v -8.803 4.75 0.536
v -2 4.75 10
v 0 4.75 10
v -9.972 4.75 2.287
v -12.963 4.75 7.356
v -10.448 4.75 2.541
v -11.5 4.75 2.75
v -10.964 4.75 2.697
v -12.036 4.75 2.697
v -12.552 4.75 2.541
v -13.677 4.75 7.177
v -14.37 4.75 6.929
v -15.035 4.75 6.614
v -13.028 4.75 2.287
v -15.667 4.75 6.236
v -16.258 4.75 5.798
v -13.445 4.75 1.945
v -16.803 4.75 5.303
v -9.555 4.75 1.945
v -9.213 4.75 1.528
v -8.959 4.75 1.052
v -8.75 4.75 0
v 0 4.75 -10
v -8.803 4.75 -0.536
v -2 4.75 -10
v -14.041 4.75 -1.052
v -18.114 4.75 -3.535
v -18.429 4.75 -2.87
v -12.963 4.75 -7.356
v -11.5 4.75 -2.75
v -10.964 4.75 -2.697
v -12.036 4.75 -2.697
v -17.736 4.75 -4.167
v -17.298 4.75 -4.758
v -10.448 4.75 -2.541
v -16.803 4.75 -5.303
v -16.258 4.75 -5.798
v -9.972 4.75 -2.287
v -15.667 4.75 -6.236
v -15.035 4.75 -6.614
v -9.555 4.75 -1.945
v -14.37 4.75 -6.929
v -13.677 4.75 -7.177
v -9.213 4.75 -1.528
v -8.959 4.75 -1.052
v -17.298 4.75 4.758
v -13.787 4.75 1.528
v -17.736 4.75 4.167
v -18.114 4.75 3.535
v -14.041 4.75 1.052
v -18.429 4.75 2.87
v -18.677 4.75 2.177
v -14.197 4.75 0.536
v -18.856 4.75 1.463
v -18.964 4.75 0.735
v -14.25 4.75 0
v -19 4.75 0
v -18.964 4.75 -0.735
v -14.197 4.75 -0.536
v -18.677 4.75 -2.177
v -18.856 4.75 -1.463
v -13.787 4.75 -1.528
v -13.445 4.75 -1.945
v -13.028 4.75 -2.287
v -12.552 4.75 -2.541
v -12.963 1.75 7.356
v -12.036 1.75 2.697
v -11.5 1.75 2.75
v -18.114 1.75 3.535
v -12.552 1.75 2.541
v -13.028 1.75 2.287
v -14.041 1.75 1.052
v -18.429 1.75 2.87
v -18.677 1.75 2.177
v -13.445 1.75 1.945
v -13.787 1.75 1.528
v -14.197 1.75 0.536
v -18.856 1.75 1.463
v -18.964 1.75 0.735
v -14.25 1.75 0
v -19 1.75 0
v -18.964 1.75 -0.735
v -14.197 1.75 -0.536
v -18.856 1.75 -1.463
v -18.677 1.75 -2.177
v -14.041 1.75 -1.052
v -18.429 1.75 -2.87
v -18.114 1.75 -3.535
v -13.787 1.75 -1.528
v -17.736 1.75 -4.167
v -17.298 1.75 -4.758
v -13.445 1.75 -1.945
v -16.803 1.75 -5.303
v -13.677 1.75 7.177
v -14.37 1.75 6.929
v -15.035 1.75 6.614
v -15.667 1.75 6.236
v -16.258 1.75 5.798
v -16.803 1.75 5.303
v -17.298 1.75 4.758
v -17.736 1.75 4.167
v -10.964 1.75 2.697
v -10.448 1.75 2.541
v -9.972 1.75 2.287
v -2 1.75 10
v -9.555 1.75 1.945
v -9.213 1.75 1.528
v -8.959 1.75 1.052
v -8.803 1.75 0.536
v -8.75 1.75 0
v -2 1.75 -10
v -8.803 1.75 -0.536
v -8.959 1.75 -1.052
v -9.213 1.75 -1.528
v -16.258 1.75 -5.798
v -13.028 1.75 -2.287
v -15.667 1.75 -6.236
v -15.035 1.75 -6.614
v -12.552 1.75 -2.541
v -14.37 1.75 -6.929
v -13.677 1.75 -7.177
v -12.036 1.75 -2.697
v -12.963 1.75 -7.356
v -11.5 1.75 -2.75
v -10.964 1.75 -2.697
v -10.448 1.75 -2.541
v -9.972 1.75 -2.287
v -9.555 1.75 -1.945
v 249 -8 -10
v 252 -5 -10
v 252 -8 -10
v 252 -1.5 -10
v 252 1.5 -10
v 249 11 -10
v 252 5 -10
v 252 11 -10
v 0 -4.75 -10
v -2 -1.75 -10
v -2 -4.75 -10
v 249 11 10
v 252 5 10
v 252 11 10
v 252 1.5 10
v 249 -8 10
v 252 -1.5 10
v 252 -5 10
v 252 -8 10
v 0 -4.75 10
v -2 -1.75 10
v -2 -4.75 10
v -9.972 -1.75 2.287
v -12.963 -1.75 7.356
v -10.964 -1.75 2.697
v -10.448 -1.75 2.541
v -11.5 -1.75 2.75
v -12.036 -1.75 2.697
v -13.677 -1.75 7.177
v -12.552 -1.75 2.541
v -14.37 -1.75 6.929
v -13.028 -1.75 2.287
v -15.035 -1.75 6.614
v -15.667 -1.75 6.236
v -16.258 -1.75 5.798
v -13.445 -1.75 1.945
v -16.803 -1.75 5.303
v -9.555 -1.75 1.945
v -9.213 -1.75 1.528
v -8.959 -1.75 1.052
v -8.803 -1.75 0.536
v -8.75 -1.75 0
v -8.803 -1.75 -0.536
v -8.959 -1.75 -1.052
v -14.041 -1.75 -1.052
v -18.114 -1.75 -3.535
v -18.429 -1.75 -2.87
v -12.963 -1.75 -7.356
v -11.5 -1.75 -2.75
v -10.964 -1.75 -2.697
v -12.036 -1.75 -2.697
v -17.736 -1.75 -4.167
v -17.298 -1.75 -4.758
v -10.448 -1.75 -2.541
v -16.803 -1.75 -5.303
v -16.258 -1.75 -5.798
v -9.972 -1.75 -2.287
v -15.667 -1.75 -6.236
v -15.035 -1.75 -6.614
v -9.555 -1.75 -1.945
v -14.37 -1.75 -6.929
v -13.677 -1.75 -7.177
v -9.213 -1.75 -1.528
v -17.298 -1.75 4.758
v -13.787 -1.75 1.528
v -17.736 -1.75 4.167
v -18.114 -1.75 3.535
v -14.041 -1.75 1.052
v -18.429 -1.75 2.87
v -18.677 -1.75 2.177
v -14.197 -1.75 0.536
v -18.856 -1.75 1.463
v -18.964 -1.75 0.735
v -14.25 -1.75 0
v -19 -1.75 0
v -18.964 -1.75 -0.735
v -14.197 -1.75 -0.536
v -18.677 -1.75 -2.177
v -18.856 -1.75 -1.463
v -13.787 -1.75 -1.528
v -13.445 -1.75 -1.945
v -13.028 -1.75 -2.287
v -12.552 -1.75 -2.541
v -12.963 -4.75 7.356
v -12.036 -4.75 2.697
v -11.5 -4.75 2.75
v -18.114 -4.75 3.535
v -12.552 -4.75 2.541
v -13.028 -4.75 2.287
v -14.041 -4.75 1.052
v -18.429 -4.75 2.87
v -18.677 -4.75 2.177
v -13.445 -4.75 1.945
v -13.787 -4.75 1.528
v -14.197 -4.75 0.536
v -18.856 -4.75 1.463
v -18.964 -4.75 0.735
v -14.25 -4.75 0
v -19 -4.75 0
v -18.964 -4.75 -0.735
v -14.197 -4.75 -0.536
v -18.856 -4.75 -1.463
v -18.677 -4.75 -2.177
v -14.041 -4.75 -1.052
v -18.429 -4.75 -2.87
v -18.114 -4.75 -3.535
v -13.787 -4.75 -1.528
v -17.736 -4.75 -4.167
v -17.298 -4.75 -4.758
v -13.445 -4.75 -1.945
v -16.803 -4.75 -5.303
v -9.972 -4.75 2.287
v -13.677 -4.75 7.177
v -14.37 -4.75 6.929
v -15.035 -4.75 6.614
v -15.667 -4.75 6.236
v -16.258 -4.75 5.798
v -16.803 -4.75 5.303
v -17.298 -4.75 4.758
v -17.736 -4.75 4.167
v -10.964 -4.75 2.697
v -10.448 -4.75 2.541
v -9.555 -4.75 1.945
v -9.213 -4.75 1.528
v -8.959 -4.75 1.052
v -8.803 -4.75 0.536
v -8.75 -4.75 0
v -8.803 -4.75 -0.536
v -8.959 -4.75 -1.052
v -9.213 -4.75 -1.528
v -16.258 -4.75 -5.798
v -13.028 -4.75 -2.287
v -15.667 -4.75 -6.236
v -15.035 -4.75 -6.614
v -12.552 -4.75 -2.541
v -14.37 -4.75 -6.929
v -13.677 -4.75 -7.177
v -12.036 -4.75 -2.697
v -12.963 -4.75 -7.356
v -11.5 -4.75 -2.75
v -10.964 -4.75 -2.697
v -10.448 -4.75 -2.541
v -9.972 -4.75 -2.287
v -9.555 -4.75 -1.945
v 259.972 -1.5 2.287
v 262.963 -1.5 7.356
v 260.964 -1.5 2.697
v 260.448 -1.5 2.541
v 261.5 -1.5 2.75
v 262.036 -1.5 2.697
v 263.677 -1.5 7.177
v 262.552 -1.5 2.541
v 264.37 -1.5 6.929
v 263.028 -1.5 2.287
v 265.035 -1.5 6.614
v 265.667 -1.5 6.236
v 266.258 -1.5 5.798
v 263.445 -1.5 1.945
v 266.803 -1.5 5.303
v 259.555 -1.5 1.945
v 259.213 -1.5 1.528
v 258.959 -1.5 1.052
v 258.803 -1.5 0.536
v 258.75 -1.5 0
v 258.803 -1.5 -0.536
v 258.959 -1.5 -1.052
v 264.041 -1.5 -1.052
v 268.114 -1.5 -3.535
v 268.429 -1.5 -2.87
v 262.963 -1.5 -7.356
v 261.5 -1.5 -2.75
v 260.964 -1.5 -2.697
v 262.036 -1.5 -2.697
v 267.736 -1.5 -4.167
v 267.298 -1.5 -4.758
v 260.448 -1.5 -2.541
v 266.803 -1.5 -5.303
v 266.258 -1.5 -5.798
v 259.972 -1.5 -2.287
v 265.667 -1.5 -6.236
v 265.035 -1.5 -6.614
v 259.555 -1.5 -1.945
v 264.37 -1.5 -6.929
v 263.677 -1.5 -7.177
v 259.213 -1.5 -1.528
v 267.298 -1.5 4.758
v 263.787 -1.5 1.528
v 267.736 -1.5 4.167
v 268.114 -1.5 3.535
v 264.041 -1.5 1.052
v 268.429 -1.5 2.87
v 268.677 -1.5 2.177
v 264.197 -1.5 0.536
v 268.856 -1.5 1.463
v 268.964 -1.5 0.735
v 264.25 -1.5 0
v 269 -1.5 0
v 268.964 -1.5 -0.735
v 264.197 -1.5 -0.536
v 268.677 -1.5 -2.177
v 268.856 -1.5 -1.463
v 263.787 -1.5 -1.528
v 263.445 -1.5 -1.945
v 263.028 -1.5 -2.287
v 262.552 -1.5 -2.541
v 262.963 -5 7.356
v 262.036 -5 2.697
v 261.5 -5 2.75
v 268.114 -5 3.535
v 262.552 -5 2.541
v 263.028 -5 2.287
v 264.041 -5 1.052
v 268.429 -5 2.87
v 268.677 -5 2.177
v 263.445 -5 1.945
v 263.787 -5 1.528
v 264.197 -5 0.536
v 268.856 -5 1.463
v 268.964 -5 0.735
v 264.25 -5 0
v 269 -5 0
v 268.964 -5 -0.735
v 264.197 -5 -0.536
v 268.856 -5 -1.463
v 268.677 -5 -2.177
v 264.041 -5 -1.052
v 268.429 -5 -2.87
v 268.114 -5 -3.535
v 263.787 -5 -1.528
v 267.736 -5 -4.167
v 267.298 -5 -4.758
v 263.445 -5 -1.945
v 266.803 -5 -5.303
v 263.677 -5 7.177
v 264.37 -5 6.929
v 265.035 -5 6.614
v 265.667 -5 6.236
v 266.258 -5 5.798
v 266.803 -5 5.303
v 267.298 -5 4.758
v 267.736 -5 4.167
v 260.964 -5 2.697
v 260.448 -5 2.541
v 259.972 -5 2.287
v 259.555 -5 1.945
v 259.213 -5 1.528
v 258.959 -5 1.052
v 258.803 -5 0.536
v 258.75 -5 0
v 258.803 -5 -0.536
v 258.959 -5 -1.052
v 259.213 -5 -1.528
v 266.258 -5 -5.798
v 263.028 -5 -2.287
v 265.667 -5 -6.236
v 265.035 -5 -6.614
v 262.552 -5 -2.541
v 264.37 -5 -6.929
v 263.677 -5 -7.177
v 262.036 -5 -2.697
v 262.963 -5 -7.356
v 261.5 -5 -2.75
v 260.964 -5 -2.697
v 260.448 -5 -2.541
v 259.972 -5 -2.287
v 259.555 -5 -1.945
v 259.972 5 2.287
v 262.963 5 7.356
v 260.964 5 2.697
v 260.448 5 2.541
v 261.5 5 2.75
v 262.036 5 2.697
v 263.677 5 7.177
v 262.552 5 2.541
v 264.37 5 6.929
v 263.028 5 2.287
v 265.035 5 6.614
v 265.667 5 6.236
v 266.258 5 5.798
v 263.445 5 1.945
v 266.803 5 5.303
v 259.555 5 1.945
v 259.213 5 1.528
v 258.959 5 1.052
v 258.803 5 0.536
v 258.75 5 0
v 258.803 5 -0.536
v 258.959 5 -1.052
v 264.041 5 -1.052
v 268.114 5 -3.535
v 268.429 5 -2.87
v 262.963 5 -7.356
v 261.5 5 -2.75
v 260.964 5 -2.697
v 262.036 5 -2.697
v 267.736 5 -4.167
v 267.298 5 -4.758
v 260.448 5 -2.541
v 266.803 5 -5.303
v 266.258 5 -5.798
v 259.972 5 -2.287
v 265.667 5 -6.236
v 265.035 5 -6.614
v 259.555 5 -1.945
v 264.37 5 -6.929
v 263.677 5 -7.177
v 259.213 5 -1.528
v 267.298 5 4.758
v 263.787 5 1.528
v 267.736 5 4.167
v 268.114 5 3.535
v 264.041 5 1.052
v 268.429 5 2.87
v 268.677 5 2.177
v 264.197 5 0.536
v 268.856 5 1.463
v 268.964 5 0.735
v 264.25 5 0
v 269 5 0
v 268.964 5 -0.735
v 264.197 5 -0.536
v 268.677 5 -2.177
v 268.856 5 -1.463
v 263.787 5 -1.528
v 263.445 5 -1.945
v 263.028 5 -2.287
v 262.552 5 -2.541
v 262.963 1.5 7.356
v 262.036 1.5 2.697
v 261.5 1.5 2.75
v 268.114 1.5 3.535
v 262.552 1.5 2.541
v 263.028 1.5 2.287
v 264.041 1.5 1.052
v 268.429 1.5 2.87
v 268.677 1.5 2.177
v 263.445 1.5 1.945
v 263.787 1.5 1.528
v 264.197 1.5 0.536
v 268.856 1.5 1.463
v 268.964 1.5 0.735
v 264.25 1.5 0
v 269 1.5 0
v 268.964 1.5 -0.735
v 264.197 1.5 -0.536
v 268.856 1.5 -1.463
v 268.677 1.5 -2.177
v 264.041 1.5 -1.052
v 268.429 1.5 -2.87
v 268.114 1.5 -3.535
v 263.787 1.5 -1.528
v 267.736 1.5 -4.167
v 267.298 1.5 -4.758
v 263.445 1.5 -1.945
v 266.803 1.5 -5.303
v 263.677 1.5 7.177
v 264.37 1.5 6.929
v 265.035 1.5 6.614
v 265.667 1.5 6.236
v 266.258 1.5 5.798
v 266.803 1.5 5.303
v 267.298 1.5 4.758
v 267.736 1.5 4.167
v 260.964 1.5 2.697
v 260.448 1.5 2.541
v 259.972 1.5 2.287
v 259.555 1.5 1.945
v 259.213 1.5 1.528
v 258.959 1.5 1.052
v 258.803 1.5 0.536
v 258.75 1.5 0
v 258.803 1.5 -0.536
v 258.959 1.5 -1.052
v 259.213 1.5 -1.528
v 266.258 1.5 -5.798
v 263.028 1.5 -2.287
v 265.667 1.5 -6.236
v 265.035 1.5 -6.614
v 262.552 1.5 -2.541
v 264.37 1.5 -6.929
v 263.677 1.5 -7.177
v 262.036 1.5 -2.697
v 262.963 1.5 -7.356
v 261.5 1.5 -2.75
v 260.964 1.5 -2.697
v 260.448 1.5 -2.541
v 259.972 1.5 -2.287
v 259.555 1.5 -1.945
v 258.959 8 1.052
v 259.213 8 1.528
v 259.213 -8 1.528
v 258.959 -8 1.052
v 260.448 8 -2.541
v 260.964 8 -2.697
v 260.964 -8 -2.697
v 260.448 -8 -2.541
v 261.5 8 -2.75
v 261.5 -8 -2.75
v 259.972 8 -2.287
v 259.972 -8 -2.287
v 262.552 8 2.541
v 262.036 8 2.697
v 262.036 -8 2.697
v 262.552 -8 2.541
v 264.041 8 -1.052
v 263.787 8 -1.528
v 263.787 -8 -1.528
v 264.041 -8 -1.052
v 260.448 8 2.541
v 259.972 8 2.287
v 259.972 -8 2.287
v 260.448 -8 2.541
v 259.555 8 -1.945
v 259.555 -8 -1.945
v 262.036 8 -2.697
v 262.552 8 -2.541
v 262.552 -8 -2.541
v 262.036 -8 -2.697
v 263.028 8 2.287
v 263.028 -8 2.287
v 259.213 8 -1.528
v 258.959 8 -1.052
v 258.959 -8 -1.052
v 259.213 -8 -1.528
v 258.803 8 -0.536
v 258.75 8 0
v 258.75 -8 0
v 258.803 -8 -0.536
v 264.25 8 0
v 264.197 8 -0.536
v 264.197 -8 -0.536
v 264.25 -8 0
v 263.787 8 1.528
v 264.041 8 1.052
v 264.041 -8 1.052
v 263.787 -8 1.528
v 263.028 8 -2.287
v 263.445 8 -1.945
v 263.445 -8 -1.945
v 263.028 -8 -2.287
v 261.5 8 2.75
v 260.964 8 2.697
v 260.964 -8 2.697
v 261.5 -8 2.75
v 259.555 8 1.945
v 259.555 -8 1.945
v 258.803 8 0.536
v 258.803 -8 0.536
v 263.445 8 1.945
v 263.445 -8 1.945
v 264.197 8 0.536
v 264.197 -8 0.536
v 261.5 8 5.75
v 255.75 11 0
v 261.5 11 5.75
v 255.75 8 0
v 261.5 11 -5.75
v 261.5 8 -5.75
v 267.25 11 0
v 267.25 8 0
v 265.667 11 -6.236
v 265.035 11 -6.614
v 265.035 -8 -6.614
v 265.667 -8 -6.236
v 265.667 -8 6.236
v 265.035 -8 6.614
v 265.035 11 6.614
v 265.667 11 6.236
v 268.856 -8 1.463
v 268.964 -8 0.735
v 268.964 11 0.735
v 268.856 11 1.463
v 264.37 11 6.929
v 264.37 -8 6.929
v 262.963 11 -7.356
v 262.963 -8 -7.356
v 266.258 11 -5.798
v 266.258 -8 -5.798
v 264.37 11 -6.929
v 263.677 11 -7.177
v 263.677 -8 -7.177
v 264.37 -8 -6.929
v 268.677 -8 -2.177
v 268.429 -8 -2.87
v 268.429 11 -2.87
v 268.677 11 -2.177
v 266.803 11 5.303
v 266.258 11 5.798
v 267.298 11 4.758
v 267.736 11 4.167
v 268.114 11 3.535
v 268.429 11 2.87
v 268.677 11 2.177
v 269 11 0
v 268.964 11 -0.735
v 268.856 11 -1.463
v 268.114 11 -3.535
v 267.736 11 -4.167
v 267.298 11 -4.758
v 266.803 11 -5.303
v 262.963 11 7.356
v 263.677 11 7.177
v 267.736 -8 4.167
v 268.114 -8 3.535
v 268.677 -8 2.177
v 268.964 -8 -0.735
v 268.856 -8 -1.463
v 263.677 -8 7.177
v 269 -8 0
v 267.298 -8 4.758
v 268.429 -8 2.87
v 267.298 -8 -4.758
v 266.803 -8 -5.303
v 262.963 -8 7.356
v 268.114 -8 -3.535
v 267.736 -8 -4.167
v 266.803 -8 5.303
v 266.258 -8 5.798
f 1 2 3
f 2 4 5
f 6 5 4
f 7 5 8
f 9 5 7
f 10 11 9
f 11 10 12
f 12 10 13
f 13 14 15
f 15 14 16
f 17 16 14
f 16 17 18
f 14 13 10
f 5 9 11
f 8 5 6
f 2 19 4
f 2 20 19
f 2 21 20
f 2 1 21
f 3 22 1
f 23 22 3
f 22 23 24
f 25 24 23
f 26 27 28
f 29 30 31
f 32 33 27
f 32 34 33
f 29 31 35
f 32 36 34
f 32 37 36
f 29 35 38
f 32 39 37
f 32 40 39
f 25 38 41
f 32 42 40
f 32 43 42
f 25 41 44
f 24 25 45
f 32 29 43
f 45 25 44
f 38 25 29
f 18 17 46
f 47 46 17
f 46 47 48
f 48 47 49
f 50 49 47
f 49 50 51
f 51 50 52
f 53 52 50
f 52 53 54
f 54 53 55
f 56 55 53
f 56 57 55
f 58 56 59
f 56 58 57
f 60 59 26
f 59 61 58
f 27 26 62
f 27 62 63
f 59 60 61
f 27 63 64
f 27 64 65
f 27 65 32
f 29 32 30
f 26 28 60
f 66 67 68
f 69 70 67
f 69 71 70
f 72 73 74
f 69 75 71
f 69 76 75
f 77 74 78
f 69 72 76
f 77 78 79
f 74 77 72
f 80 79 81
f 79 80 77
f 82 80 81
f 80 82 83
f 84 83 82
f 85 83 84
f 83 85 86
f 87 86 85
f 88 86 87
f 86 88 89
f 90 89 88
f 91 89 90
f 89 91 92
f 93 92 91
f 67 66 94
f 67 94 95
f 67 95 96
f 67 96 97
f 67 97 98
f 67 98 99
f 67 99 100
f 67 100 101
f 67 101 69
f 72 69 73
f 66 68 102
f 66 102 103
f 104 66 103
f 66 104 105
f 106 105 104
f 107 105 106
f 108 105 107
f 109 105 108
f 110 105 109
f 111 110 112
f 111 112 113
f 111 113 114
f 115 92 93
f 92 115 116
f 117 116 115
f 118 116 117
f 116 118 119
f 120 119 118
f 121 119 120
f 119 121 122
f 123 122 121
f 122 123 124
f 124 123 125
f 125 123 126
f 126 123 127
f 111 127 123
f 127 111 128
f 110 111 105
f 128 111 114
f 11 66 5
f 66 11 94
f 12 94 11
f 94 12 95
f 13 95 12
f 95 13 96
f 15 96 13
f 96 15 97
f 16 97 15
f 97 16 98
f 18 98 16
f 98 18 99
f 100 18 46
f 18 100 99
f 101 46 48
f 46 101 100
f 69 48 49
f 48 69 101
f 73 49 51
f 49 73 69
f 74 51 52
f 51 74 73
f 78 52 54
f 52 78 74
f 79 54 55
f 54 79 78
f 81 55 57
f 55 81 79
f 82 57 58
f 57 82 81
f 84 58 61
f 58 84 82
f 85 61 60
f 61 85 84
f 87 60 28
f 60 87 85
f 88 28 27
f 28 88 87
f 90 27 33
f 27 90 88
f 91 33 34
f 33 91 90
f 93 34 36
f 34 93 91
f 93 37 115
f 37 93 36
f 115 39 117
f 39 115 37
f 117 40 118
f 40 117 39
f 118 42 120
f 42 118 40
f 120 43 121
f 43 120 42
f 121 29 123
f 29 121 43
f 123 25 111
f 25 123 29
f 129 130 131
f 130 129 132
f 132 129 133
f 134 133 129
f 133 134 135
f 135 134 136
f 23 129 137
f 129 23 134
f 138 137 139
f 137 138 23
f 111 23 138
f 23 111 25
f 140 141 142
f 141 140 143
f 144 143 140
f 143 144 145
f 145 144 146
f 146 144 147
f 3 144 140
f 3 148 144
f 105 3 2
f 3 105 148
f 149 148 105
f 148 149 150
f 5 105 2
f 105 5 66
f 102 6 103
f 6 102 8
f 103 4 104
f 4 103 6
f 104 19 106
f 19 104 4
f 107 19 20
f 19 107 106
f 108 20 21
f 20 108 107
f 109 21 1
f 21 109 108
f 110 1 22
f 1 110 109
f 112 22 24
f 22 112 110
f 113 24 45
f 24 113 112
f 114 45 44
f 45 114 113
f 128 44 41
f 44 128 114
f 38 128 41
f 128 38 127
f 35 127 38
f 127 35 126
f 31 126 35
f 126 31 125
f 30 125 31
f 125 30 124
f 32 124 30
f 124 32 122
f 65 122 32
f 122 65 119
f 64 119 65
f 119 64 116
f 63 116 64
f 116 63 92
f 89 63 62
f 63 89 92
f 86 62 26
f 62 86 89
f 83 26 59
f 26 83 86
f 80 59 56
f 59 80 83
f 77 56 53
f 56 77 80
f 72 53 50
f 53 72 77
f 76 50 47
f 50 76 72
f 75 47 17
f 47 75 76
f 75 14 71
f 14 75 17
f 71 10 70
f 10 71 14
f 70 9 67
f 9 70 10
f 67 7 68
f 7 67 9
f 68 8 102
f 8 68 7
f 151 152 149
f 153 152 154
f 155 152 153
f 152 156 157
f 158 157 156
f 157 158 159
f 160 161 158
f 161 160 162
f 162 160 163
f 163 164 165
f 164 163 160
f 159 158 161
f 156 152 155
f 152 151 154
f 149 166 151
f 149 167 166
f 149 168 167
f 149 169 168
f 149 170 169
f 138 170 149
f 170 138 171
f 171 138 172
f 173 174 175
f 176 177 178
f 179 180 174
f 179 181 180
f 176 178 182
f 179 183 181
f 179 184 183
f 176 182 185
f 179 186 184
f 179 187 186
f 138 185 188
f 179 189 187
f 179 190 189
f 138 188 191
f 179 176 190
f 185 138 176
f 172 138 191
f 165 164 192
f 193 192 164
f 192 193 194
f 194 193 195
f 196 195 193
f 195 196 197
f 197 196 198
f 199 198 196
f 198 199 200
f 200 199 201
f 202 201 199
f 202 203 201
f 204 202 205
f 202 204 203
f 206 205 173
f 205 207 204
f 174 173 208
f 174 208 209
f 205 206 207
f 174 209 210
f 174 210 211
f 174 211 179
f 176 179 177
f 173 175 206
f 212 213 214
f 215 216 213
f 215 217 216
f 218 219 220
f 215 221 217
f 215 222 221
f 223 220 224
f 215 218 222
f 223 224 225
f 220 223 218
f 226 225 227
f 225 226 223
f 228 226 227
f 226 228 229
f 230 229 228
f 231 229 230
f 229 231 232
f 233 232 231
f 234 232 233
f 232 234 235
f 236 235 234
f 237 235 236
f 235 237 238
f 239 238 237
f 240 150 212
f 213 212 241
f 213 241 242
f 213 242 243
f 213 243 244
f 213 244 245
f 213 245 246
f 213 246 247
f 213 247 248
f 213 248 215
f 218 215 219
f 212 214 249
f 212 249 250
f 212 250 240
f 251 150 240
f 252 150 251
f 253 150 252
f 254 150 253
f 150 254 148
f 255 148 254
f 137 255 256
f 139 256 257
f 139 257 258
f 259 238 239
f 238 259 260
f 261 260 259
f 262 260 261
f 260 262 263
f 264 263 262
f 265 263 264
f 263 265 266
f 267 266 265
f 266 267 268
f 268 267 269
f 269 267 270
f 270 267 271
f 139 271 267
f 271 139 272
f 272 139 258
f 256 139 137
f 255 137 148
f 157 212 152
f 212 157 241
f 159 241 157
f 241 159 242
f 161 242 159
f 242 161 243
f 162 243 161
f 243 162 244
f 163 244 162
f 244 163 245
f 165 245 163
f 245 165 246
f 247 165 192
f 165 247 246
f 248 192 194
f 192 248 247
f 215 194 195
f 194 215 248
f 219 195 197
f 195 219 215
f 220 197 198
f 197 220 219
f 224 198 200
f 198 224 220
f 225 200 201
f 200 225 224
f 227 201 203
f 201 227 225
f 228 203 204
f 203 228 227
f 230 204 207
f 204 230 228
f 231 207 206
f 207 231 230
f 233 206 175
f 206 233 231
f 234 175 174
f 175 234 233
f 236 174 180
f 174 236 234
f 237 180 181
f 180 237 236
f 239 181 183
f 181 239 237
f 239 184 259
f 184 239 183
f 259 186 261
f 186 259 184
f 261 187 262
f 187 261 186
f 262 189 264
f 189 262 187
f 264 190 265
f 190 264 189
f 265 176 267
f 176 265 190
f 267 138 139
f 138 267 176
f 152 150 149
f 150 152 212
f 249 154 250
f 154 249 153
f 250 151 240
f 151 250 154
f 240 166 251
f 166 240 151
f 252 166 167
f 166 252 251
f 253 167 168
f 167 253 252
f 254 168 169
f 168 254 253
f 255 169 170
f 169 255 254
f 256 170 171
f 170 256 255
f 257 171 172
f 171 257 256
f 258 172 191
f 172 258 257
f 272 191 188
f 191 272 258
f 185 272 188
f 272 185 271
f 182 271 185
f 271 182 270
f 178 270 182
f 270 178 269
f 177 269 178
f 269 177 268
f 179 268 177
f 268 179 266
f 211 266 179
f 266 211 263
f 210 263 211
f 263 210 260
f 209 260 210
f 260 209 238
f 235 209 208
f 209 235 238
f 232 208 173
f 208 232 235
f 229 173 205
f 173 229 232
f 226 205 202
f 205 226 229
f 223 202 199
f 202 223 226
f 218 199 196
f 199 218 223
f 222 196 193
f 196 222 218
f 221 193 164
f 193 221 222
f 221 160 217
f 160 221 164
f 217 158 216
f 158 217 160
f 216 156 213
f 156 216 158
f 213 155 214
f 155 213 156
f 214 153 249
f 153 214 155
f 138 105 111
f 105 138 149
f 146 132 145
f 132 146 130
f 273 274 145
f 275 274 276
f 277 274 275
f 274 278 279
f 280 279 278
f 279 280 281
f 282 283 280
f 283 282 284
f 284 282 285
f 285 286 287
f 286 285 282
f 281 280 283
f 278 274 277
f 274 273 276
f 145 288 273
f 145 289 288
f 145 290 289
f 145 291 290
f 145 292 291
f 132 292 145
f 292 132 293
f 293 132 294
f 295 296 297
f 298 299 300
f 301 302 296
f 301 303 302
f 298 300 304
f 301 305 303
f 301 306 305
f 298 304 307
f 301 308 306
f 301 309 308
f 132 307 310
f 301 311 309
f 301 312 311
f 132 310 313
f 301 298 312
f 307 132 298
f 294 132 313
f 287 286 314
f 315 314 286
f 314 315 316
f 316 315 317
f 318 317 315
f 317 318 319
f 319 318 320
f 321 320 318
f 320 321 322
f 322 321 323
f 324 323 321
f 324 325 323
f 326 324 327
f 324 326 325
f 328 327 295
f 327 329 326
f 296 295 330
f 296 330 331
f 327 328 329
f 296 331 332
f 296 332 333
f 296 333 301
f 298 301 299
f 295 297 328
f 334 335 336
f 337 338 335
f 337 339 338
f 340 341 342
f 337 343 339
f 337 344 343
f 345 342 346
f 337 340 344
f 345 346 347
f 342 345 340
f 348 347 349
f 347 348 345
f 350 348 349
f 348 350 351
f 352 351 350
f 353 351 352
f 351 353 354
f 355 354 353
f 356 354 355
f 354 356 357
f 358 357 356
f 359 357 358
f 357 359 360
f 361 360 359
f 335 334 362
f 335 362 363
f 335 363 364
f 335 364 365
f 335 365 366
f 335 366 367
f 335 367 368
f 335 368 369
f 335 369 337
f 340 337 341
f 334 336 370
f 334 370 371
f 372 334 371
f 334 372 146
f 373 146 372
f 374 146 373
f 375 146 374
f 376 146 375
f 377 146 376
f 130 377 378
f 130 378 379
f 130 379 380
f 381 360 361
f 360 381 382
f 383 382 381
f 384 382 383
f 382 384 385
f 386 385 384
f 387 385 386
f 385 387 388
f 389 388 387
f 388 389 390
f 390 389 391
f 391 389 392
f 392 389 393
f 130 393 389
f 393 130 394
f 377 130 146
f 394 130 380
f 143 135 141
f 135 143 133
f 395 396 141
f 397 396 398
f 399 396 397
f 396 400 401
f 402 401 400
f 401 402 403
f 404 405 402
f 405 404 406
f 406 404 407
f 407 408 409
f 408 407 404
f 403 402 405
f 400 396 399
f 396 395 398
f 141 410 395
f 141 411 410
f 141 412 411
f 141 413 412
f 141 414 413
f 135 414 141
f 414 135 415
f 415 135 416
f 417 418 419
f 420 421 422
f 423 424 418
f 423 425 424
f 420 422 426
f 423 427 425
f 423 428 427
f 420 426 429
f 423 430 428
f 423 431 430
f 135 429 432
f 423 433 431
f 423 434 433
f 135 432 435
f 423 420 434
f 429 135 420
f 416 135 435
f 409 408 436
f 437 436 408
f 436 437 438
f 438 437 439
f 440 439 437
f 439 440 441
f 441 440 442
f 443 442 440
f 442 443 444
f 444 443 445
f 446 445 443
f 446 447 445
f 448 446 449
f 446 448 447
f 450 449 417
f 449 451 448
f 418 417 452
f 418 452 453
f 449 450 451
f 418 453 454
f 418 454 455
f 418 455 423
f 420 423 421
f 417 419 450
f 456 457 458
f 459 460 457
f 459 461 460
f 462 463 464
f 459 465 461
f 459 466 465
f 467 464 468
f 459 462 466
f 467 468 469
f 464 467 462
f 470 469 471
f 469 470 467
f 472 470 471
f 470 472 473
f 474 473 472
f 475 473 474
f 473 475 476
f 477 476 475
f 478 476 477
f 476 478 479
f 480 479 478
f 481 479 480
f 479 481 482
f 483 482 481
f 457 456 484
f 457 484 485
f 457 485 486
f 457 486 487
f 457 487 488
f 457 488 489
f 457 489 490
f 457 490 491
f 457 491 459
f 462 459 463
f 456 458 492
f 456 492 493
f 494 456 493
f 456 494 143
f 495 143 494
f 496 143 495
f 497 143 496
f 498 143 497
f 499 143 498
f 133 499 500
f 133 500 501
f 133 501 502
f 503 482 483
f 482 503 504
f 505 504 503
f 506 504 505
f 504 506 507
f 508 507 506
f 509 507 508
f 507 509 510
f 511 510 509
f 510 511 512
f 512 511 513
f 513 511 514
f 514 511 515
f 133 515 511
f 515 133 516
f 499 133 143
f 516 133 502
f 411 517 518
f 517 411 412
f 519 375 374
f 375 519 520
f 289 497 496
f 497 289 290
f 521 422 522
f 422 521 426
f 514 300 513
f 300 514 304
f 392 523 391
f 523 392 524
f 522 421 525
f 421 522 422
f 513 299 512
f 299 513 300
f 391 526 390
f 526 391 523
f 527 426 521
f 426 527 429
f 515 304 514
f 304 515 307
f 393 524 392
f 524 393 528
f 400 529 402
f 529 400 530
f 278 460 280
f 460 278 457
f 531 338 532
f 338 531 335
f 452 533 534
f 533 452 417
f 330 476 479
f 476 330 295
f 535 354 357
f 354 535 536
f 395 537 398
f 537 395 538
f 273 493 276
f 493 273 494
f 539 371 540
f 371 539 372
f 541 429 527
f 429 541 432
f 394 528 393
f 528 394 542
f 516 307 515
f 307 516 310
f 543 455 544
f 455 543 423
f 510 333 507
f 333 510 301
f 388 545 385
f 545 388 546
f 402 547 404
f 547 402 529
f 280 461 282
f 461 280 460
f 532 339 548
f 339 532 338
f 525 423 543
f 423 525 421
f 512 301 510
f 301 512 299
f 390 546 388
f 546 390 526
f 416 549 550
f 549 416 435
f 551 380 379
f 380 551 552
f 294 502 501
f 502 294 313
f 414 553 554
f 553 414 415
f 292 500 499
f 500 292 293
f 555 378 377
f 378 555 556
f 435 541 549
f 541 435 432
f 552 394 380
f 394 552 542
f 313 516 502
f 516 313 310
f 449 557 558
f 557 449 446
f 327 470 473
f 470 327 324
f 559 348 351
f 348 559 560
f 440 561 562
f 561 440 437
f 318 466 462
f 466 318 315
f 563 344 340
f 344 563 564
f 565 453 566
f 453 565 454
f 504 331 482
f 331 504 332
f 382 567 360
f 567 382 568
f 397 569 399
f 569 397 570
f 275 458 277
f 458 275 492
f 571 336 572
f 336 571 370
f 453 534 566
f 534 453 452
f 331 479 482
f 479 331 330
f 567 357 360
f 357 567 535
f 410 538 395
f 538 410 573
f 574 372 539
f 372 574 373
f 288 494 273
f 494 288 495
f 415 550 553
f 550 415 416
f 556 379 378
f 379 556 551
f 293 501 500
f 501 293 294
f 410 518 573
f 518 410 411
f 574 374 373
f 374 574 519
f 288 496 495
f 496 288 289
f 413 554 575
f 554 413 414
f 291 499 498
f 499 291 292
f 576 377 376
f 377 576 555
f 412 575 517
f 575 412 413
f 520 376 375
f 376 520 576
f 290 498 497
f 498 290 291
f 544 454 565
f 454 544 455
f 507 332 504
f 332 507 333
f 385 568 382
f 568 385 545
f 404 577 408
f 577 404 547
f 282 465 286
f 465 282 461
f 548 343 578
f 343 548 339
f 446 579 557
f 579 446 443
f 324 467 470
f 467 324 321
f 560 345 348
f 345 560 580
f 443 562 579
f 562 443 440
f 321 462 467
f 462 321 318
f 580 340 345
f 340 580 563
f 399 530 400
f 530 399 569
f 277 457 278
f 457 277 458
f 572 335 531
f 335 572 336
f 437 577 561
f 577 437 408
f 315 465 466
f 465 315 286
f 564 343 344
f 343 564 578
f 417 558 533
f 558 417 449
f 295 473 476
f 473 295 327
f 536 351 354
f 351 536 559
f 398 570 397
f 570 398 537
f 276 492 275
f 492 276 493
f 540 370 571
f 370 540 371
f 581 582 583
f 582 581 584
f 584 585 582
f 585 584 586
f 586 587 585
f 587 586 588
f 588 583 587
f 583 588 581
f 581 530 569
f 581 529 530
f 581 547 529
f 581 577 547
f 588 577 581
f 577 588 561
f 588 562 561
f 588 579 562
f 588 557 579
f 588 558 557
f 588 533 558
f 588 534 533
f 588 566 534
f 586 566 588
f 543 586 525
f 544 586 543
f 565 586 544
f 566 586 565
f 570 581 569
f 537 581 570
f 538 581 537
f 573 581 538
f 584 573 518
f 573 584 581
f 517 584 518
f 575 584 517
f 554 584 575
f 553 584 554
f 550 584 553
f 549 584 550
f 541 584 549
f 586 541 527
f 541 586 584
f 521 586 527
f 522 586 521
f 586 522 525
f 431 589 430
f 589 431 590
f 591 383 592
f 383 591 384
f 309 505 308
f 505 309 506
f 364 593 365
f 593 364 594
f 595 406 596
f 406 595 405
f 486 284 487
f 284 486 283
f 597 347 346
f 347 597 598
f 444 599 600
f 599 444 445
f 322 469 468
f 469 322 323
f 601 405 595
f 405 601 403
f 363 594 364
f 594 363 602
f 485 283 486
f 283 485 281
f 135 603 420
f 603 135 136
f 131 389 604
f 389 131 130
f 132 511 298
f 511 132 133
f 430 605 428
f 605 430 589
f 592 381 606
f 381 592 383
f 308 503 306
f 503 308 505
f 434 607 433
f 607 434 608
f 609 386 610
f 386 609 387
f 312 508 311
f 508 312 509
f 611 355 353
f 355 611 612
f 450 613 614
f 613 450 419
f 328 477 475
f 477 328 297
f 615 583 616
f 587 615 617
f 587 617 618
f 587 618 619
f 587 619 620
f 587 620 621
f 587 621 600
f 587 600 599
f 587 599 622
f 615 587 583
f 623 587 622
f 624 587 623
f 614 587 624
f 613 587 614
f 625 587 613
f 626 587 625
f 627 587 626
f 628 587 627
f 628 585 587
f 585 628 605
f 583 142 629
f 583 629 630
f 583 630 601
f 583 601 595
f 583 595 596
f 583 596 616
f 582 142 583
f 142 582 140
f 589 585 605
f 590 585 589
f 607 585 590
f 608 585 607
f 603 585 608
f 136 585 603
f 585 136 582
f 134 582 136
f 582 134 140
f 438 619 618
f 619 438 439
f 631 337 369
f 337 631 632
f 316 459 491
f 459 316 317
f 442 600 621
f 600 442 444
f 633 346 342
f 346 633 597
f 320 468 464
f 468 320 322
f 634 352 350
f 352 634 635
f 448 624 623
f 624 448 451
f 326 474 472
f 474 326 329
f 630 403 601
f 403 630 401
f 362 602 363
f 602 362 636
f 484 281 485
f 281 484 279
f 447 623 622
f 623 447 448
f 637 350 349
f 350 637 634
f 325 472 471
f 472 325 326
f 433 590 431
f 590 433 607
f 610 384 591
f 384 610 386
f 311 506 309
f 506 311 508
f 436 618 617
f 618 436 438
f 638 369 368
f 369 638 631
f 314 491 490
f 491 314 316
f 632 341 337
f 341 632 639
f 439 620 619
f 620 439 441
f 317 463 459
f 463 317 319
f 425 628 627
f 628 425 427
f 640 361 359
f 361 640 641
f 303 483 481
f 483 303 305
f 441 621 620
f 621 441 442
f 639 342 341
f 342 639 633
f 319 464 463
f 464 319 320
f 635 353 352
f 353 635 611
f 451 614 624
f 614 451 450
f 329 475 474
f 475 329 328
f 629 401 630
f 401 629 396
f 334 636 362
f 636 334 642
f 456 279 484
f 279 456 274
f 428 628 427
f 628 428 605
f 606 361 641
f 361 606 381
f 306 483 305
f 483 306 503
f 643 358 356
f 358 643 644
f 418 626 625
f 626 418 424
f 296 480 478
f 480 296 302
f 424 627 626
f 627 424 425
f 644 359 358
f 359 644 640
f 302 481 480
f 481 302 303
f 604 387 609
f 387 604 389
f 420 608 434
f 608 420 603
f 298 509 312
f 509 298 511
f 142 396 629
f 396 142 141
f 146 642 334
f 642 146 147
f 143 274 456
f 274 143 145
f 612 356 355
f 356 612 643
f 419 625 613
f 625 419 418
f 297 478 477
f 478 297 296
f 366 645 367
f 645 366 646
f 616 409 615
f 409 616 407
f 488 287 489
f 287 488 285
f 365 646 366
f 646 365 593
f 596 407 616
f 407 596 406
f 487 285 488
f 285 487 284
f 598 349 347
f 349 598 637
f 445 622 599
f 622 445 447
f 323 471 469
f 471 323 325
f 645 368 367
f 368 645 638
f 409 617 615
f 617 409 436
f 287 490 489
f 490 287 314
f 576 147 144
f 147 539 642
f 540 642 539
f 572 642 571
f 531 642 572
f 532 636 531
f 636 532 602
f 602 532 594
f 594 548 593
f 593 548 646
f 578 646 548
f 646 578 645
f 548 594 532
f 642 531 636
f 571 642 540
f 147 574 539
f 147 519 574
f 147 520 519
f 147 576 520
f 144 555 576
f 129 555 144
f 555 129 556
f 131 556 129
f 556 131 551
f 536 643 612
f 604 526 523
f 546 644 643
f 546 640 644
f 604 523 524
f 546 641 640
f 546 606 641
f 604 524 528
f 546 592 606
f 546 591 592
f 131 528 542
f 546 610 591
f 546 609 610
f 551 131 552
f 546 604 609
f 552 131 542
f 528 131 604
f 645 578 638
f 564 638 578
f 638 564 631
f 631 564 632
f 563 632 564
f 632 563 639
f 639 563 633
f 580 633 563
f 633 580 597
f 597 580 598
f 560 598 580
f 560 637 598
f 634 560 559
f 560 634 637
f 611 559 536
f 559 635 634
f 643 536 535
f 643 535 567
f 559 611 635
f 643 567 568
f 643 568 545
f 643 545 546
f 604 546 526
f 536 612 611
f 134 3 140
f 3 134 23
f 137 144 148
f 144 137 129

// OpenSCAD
// file: ../GoPro.scad
/****************************************************************************
 * Altair's GoPro mounts library for OpenSCAD   version: 1.2.2 (2021-05-23) *
 * Copyright (c) Michal A. Valasek, 2021                                    *
 * ------------------------------------------------------------------------ *
 * www.rider.cz | www.altair.blog | github.com/ridercz/GoProScad            *
 ****************************************************************************/

// These values are fixed and defined by GoPro mount standard
__gopro_outer_diameter = 15;            // Outer diameter of the legs
__gopro_leg_width = 3;                  // Width of the legs
__gopro_slit_width = 3.5;               // Width of the slits, including tolerance
__gopro_hole_diameter = 5;              // M5
__gopro_hole_tolerance = .5;            // Print tolerance for hole
__gopro_screw_extension_length = 18;    // Length of the part of screw that sticks out
__gopro_screw_head_diameter = 9.5;      // M5
__gopro_screw_head_height = 3.5;        // M5
__gopro_wall_shaft = 1.67;              // Thickness of wall in the narrow part
__gopro_wall_head = 3;                  // Thickness of wall in the wide part
__gopro_knurl_diameter = 4;             // Diameter of knurls
__gopro_knurl_offset = -1;              // Center distance offset of knurls

module gopro_mount_f(base_height = 3, base_width = 20, leg_height = 17, nut_diameter = 11.5, nut_sides = 4, nut_depth = 3, center = false, $fudge = 1) {
    // Check arguments
    assert(base_height > 0, "Parameter base_height must be greater than zero.");
    assert(base_width >= 15, "Parameter base_width must be at least 15.");
    assert(leg_height >= 15, "Parameter leg_height must be at least 15.");
    assert(nut_sides == 4 || nut_sides == 6, "Parameter nut_sides must be either 4 or 6.");

    // Computed values
    hole_offset = leg_height - __gopro_outer_diameter / 2 + base_height;
    base_depth = __gopro_slit_width * 2 + __gopro_leg_width * 3 + nut_depth;
    center_offset_y = __gopro_leg_width * 1.5 + __gopro_slit_width;

    // Model itself
    translate(center ? [0, -center_offset_y] : [0, 0]) difference() {
        // Outer shape
        hull() {
            translate([-base_width / 2, 0]) cube([base_width, base_depth, base_height]);
            translate([0, 0, hole_offset]) rotate([-90, 0, 0]) cylinder(d = __gopro_outer_diameter, h = base_depth, $fn = 64);
        }

        // Leg slits
        for(y_offset = [__gopro_leg_width, 2 * __gopro_leg_width + __gopro_slit_width]) translate([-base_width / 2 - $fudge, y_offset, base_height]) cube([base_width + 2 * $fudge, __gopro_slit_width, leg_height]);

        // Screw + nut hole
        translate([0, -$fudge, hole_offset]) rotate([-90, 0,0]) {
            cylinder(d = __gopro_hole_diameter + __gopro_hole_tolerance, h = base_depth + 2 * $fudge, $fn = 32);
            if(nut_depth > 0) translate([0, 0, base_depth + $fudge - nut_depth]) cylinder(d = nut_diameter, h = nut_depth + $fudge, $fn = nut_sides);
        }
    }
}

module gopro_mount_m(base_height = 3, base_width = 20, leg_height = 17, center = false) {
    assert(base_height > 0, "Parameter base_height must be greater than zero.");
    assert(base_width >= 15, "Parameter base_width must be at least 15.");
    assert(leg_height >= 15, "Parameter leg_height must be at least 15.");

    // Computed values
    base_depth = __gopro_leg_width * 2 + __gopro_slit_width;
    hole_offset = [base_height + leg_height - __gopro_outer_diameter / 2, base_width / 2];

    // Model itself
    translate(center ? [0, -base_depth / 2] : [0, 0]) {
        translate([-base_width / 2, 0]) cube([base_width, __gopro_leg_width * 2 + __gopro_slit_width, base_height]);
        translate([0, __gopro_leg_width + __gopro_slit_width / 2]) rotate(90) translate([base_depth / 2, -hole_offset[1]]) rotate([0, -90, 0]) for(z_offset = [0, __gopro_leg_width + __gopro_slit_width]) translate([0, 0, z_offset]) linear_extrude(__gopro_leg_width) difference() {
            hull() {
                square([base_height, base_width]);
                translate(hole_offset) circle(d = __gopro_outer_diameter, $fn = 64);
            }
            translate(hole_offset) circle(d = __gopro_hole_diameter + __gopro_hole_tolerance, $fn = 32);
        }
    }
}

module gopro_screw_handle(screw_length = 50, total_length = 0, hex_head = true, $fudge = 1) {
    assert(screw_length > __gopro_screw_extension_length + 3, "Parameter screw_length is too short.");

    // Computed values
    screw_inner_length = screw_length - __gopro_screw_extension_length;
    screw_hole_diameter = __gopro_hole_diameter + (hex_head ? __gopro_hole_tolerance : 0);
    real_total_length = total_length > 0 ? total_length : screw_inner_length + 3 * __gopro_screw_head_height;
    handle_length = real_total_length - screw_inner_length + (hex_head ? 0 : __gopro_screw_head_height);

    difference() {
        union() {
            // Base shape
            hull() {
                cylinder(d = screw_hole_diameter + 2 * __gopro_wall_shaft, h = real_total_length, $fn = 32);
                cylinder(d = __gopro_screw_head_diameter + 2 * __gopro_wall_head, h = handle_length, $fn = 6);
            }

            // Knurls
            for(a = [0 : 60 : 359]) rotate(a) translate([__gopro_screw_head_diameter / 2 + __gopro_wall_head + __gopro_knurl_offset, 0]) {
                cylinder(d = __gopro_knurl_diameter, h = handle_length * .75, $fn = 24);
                translate([0, 0, handle_length * .75]) cylinder(d1 = __gopro_knurl_diameter, d2 = 0, h = handle_length * .25, $fn = 16);
            }
        }

        // Screw hole
        translate([0, 0, -$fudge]) cylinder(d = screw_hole_diameter, h = real_total_length + 2 * $fudge, $fn = 32);
	    translate([0, 0, -$fudge]) cylinder(d = __gopro_screw_head_diameter, h = handle_length + $fudge, $fn = hex_head ? 6 : 32);
    }
}
// main file
/****************************************************************************
 * GoPro mount extension arm                                                *
 * Copyright (c) Michal A. Valasek, 2021                                    *
 * ------------------------------------------------------------------------ *
 * www.rider.cz | www.altair.blog | github.com/ridercz/GoProScad            *
 ****************************************************************************/

include <../GoPro.scad>;    // https://github.com/ridercz/GoProScad

length = 250;

/* [Hidden] */
$fudge = 1;

mounts();
hull() intersection() {
    // This is kind of ugly hack and does not help performance very much.
    // But this is simple model, so screw performance :)
    mounts();
    rotate([0, 90, 0]) linear_extrude(length) square(30, center = true);
}

module mounts() {
    translate([$fudge, 0, 0]) rotate([0, -90, 0]) gopro_mount_m($fudge = $fudge, center = true);
    translate([length - $fudge, 0]) rotate([0, +90, 0]) gopro_mount_f($fudge = $fudge, center = true);
}
